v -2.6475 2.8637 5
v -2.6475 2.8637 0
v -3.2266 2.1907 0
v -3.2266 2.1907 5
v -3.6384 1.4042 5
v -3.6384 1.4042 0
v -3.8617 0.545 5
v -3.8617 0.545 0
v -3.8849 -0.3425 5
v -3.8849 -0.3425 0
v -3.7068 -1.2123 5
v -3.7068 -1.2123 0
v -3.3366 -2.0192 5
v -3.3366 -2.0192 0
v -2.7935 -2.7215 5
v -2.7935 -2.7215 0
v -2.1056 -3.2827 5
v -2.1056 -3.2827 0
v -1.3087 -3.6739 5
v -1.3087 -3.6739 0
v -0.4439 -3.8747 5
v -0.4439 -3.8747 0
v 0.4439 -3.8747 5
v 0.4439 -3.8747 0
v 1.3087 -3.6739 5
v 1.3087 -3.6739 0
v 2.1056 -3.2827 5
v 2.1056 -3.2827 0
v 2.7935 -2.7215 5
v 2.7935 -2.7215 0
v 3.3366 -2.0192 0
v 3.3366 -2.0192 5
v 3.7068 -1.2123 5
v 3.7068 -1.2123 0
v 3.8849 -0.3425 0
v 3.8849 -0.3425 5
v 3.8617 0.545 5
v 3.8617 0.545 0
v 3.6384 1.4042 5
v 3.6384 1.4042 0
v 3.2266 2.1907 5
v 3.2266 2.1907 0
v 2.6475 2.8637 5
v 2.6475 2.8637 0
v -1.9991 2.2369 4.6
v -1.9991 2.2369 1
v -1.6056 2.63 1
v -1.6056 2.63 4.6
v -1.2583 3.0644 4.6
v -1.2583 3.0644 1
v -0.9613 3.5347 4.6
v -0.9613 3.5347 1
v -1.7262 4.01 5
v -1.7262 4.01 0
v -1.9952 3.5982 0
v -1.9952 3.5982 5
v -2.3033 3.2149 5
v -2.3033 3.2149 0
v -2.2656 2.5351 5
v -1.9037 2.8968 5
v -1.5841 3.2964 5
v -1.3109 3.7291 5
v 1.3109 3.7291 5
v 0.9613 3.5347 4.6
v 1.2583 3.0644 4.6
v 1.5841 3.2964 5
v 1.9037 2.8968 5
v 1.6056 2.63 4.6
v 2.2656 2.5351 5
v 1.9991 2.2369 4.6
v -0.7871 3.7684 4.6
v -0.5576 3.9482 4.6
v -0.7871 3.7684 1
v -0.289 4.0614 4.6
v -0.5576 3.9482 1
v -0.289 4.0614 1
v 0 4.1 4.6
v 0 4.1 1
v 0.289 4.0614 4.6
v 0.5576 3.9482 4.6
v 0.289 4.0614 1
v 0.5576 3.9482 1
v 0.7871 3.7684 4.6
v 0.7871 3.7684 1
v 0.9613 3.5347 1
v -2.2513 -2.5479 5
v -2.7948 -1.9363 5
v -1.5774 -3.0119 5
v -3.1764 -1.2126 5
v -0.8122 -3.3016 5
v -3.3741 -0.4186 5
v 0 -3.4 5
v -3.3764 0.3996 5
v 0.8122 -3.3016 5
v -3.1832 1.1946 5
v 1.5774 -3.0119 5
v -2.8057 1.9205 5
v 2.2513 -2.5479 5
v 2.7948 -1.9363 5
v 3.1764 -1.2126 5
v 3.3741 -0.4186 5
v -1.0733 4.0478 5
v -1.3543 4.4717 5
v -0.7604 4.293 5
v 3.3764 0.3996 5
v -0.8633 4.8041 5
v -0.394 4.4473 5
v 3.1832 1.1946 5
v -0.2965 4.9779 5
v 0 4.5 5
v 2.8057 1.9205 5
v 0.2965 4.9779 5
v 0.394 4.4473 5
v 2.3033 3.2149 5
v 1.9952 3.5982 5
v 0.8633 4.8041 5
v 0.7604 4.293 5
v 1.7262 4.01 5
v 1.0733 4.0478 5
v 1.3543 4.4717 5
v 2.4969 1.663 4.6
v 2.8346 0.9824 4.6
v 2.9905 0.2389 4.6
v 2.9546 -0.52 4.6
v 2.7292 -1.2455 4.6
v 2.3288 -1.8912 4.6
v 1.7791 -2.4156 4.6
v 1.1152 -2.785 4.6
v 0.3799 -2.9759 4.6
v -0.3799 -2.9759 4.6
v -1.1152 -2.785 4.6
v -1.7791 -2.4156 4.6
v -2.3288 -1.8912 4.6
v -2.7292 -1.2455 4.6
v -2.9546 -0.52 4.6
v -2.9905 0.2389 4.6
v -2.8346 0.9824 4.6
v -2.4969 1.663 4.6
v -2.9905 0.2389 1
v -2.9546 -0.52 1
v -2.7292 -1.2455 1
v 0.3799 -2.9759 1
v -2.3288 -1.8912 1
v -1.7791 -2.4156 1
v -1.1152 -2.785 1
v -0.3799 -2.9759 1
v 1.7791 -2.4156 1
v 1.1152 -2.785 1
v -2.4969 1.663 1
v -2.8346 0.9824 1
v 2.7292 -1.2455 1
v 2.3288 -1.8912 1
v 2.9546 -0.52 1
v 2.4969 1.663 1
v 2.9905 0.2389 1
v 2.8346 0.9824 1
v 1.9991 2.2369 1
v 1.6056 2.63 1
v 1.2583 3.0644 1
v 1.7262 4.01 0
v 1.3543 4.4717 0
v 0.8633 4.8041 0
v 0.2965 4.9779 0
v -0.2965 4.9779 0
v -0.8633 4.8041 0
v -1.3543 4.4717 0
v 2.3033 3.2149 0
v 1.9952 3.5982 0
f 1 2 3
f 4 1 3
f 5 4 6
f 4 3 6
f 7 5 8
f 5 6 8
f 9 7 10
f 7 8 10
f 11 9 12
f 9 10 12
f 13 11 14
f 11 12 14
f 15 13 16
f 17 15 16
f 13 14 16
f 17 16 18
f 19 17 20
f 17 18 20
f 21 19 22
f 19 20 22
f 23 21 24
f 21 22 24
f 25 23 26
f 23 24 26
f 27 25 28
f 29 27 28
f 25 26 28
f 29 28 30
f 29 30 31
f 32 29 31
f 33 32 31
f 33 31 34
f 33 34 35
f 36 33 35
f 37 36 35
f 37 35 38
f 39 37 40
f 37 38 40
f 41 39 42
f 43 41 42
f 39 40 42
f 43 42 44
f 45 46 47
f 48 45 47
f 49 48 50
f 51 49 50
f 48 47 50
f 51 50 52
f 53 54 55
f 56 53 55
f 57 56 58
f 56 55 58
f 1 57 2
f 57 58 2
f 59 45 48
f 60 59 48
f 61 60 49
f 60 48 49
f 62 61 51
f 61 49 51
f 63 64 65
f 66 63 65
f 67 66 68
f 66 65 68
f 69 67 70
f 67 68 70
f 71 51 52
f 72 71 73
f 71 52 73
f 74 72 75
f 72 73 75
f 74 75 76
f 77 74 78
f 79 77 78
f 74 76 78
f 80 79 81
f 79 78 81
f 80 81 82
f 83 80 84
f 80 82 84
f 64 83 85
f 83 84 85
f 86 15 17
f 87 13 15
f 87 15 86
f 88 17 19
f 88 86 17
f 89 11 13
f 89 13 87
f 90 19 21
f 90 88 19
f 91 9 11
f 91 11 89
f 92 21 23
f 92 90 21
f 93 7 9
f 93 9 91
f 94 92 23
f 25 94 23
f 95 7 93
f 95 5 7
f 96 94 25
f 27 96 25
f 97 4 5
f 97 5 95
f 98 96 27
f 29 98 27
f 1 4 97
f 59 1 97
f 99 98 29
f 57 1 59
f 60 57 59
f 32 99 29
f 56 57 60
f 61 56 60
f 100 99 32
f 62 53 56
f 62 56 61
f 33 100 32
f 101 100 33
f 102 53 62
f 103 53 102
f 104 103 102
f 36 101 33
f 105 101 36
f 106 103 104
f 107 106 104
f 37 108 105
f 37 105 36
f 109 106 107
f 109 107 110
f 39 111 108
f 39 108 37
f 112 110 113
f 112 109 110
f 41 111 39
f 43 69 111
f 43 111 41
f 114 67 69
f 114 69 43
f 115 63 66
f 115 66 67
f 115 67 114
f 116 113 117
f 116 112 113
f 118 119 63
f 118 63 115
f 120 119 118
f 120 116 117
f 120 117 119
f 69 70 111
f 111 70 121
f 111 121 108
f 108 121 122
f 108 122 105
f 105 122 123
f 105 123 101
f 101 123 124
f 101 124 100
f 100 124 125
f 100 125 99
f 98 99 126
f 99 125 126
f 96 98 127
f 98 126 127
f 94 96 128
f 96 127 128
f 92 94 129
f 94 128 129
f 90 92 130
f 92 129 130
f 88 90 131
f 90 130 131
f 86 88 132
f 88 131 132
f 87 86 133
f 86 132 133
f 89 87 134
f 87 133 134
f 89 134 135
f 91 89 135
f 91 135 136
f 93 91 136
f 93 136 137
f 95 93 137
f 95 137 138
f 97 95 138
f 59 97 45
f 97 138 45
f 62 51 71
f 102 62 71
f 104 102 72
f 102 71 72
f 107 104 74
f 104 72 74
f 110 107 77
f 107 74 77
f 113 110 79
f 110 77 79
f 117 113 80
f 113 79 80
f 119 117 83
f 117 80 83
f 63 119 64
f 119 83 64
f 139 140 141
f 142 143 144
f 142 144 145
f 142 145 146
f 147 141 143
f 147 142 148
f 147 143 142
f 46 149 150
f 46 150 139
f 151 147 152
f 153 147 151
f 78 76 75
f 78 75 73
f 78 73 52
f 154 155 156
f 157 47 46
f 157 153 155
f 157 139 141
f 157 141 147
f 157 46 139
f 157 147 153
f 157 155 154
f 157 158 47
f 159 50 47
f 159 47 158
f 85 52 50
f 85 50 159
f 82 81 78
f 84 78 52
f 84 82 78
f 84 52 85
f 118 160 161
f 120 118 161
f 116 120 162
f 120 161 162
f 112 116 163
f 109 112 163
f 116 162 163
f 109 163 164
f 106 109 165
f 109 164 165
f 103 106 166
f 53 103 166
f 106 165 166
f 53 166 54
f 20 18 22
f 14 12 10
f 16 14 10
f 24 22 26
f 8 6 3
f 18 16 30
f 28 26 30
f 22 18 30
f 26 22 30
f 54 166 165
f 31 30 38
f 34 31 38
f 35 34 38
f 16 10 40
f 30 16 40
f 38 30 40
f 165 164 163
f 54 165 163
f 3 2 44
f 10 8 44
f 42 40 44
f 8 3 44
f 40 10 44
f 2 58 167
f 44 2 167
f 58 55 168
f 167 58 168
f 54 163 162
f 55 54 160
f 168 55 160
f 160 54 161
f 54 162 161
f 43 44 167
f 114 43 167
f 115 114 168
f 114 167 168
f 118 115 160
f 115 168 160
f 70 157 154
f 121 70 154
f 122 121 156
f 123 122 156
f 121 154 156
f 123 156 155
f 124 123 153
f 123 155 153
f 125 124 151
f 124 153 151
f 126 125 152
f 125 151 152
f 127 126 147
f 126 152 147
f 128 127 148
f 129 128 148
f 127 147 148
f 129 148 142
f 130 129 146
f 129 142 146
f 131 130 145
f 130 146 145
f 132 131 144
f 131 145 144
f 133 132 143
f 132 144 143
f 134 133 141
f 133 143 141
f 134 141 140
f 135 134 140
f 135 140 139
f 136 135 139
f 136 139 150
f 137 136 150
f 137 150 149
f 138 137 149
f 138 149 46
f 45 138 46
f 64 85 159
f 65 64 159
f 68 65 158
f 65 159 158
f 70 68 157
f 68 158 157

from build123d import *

# Parameters (mm, degrees)
F1_DEPTH = 5
F3_DEPTH = 1
F4_SIZE  = 0.4


with BuildPart() as f1:
    # F0 (on Top) → F1 (new body)
    with BuildSketch(Plane.XY):
        with BuildLine():
            ThreePointArc((-1.726239, 4.01), (-2.144514, 3.402767), (-2.647546, 2.863652))
            ThreePointArc((-2.647546, 2.863652), (0, -3.9), (2.647546, 2.863652))
            ThreePointArc((2.647546, 2.863652), (2.144514, 3.402767), (1.726239, 4.01))
            ThreePointArc((1.726239, 4.01), (0, 5), (-1.726239, 4.01))
        make_face()
        with BuildLine():
            ThreePointArc((1.999097, 2.236875), (0, -3), (-1.999097, 2.236875))
            ThreePointArc((-1.999097, 2.236875), (-1.425915, 2.842359), (-0.961315, 3.534672))
            ThreePointArc((-0.961315, 3.534672), (0, 4.1), (0.961315, 3.534672))
            ThreePointArc((0.961315, 3.534672), (1.425915, 2.842359), (1.999097, 2.236875))
        make_face(mode=Mode.SUBTRACT)
    extrude(amount=F1_DEPTH)

    # F2 (on Top) → F3 (join)
    with BuildSketch(Plane.XY):
        with BuildLine():
            ThreePointArc((-0.961315, 3.534672), (-1.425915, 2.842359), (-1.999097, 2.236875))
            ThreePointArc((-1.999097, 2.236875), (0, -3), (1.999097, 2.236875))
            ThreePointArc((1.999097, 2.236875), (1.425915, 2.842359), (0.961315, 3.534672))
            ThreePointArc((0.961315, 3.534672), (0, 4.1), (-0.961315, 3.534672))
        make_face()
    extrude(amount=F3_DEPTH)

    # F4
    f4_edges = [f1.edges().sort_by_distance(p)[0] for p in [
        (0, -3, 5),
    ]]
    chamfer(f4_edges, length=F4_SIZE)


solid = f1.part
